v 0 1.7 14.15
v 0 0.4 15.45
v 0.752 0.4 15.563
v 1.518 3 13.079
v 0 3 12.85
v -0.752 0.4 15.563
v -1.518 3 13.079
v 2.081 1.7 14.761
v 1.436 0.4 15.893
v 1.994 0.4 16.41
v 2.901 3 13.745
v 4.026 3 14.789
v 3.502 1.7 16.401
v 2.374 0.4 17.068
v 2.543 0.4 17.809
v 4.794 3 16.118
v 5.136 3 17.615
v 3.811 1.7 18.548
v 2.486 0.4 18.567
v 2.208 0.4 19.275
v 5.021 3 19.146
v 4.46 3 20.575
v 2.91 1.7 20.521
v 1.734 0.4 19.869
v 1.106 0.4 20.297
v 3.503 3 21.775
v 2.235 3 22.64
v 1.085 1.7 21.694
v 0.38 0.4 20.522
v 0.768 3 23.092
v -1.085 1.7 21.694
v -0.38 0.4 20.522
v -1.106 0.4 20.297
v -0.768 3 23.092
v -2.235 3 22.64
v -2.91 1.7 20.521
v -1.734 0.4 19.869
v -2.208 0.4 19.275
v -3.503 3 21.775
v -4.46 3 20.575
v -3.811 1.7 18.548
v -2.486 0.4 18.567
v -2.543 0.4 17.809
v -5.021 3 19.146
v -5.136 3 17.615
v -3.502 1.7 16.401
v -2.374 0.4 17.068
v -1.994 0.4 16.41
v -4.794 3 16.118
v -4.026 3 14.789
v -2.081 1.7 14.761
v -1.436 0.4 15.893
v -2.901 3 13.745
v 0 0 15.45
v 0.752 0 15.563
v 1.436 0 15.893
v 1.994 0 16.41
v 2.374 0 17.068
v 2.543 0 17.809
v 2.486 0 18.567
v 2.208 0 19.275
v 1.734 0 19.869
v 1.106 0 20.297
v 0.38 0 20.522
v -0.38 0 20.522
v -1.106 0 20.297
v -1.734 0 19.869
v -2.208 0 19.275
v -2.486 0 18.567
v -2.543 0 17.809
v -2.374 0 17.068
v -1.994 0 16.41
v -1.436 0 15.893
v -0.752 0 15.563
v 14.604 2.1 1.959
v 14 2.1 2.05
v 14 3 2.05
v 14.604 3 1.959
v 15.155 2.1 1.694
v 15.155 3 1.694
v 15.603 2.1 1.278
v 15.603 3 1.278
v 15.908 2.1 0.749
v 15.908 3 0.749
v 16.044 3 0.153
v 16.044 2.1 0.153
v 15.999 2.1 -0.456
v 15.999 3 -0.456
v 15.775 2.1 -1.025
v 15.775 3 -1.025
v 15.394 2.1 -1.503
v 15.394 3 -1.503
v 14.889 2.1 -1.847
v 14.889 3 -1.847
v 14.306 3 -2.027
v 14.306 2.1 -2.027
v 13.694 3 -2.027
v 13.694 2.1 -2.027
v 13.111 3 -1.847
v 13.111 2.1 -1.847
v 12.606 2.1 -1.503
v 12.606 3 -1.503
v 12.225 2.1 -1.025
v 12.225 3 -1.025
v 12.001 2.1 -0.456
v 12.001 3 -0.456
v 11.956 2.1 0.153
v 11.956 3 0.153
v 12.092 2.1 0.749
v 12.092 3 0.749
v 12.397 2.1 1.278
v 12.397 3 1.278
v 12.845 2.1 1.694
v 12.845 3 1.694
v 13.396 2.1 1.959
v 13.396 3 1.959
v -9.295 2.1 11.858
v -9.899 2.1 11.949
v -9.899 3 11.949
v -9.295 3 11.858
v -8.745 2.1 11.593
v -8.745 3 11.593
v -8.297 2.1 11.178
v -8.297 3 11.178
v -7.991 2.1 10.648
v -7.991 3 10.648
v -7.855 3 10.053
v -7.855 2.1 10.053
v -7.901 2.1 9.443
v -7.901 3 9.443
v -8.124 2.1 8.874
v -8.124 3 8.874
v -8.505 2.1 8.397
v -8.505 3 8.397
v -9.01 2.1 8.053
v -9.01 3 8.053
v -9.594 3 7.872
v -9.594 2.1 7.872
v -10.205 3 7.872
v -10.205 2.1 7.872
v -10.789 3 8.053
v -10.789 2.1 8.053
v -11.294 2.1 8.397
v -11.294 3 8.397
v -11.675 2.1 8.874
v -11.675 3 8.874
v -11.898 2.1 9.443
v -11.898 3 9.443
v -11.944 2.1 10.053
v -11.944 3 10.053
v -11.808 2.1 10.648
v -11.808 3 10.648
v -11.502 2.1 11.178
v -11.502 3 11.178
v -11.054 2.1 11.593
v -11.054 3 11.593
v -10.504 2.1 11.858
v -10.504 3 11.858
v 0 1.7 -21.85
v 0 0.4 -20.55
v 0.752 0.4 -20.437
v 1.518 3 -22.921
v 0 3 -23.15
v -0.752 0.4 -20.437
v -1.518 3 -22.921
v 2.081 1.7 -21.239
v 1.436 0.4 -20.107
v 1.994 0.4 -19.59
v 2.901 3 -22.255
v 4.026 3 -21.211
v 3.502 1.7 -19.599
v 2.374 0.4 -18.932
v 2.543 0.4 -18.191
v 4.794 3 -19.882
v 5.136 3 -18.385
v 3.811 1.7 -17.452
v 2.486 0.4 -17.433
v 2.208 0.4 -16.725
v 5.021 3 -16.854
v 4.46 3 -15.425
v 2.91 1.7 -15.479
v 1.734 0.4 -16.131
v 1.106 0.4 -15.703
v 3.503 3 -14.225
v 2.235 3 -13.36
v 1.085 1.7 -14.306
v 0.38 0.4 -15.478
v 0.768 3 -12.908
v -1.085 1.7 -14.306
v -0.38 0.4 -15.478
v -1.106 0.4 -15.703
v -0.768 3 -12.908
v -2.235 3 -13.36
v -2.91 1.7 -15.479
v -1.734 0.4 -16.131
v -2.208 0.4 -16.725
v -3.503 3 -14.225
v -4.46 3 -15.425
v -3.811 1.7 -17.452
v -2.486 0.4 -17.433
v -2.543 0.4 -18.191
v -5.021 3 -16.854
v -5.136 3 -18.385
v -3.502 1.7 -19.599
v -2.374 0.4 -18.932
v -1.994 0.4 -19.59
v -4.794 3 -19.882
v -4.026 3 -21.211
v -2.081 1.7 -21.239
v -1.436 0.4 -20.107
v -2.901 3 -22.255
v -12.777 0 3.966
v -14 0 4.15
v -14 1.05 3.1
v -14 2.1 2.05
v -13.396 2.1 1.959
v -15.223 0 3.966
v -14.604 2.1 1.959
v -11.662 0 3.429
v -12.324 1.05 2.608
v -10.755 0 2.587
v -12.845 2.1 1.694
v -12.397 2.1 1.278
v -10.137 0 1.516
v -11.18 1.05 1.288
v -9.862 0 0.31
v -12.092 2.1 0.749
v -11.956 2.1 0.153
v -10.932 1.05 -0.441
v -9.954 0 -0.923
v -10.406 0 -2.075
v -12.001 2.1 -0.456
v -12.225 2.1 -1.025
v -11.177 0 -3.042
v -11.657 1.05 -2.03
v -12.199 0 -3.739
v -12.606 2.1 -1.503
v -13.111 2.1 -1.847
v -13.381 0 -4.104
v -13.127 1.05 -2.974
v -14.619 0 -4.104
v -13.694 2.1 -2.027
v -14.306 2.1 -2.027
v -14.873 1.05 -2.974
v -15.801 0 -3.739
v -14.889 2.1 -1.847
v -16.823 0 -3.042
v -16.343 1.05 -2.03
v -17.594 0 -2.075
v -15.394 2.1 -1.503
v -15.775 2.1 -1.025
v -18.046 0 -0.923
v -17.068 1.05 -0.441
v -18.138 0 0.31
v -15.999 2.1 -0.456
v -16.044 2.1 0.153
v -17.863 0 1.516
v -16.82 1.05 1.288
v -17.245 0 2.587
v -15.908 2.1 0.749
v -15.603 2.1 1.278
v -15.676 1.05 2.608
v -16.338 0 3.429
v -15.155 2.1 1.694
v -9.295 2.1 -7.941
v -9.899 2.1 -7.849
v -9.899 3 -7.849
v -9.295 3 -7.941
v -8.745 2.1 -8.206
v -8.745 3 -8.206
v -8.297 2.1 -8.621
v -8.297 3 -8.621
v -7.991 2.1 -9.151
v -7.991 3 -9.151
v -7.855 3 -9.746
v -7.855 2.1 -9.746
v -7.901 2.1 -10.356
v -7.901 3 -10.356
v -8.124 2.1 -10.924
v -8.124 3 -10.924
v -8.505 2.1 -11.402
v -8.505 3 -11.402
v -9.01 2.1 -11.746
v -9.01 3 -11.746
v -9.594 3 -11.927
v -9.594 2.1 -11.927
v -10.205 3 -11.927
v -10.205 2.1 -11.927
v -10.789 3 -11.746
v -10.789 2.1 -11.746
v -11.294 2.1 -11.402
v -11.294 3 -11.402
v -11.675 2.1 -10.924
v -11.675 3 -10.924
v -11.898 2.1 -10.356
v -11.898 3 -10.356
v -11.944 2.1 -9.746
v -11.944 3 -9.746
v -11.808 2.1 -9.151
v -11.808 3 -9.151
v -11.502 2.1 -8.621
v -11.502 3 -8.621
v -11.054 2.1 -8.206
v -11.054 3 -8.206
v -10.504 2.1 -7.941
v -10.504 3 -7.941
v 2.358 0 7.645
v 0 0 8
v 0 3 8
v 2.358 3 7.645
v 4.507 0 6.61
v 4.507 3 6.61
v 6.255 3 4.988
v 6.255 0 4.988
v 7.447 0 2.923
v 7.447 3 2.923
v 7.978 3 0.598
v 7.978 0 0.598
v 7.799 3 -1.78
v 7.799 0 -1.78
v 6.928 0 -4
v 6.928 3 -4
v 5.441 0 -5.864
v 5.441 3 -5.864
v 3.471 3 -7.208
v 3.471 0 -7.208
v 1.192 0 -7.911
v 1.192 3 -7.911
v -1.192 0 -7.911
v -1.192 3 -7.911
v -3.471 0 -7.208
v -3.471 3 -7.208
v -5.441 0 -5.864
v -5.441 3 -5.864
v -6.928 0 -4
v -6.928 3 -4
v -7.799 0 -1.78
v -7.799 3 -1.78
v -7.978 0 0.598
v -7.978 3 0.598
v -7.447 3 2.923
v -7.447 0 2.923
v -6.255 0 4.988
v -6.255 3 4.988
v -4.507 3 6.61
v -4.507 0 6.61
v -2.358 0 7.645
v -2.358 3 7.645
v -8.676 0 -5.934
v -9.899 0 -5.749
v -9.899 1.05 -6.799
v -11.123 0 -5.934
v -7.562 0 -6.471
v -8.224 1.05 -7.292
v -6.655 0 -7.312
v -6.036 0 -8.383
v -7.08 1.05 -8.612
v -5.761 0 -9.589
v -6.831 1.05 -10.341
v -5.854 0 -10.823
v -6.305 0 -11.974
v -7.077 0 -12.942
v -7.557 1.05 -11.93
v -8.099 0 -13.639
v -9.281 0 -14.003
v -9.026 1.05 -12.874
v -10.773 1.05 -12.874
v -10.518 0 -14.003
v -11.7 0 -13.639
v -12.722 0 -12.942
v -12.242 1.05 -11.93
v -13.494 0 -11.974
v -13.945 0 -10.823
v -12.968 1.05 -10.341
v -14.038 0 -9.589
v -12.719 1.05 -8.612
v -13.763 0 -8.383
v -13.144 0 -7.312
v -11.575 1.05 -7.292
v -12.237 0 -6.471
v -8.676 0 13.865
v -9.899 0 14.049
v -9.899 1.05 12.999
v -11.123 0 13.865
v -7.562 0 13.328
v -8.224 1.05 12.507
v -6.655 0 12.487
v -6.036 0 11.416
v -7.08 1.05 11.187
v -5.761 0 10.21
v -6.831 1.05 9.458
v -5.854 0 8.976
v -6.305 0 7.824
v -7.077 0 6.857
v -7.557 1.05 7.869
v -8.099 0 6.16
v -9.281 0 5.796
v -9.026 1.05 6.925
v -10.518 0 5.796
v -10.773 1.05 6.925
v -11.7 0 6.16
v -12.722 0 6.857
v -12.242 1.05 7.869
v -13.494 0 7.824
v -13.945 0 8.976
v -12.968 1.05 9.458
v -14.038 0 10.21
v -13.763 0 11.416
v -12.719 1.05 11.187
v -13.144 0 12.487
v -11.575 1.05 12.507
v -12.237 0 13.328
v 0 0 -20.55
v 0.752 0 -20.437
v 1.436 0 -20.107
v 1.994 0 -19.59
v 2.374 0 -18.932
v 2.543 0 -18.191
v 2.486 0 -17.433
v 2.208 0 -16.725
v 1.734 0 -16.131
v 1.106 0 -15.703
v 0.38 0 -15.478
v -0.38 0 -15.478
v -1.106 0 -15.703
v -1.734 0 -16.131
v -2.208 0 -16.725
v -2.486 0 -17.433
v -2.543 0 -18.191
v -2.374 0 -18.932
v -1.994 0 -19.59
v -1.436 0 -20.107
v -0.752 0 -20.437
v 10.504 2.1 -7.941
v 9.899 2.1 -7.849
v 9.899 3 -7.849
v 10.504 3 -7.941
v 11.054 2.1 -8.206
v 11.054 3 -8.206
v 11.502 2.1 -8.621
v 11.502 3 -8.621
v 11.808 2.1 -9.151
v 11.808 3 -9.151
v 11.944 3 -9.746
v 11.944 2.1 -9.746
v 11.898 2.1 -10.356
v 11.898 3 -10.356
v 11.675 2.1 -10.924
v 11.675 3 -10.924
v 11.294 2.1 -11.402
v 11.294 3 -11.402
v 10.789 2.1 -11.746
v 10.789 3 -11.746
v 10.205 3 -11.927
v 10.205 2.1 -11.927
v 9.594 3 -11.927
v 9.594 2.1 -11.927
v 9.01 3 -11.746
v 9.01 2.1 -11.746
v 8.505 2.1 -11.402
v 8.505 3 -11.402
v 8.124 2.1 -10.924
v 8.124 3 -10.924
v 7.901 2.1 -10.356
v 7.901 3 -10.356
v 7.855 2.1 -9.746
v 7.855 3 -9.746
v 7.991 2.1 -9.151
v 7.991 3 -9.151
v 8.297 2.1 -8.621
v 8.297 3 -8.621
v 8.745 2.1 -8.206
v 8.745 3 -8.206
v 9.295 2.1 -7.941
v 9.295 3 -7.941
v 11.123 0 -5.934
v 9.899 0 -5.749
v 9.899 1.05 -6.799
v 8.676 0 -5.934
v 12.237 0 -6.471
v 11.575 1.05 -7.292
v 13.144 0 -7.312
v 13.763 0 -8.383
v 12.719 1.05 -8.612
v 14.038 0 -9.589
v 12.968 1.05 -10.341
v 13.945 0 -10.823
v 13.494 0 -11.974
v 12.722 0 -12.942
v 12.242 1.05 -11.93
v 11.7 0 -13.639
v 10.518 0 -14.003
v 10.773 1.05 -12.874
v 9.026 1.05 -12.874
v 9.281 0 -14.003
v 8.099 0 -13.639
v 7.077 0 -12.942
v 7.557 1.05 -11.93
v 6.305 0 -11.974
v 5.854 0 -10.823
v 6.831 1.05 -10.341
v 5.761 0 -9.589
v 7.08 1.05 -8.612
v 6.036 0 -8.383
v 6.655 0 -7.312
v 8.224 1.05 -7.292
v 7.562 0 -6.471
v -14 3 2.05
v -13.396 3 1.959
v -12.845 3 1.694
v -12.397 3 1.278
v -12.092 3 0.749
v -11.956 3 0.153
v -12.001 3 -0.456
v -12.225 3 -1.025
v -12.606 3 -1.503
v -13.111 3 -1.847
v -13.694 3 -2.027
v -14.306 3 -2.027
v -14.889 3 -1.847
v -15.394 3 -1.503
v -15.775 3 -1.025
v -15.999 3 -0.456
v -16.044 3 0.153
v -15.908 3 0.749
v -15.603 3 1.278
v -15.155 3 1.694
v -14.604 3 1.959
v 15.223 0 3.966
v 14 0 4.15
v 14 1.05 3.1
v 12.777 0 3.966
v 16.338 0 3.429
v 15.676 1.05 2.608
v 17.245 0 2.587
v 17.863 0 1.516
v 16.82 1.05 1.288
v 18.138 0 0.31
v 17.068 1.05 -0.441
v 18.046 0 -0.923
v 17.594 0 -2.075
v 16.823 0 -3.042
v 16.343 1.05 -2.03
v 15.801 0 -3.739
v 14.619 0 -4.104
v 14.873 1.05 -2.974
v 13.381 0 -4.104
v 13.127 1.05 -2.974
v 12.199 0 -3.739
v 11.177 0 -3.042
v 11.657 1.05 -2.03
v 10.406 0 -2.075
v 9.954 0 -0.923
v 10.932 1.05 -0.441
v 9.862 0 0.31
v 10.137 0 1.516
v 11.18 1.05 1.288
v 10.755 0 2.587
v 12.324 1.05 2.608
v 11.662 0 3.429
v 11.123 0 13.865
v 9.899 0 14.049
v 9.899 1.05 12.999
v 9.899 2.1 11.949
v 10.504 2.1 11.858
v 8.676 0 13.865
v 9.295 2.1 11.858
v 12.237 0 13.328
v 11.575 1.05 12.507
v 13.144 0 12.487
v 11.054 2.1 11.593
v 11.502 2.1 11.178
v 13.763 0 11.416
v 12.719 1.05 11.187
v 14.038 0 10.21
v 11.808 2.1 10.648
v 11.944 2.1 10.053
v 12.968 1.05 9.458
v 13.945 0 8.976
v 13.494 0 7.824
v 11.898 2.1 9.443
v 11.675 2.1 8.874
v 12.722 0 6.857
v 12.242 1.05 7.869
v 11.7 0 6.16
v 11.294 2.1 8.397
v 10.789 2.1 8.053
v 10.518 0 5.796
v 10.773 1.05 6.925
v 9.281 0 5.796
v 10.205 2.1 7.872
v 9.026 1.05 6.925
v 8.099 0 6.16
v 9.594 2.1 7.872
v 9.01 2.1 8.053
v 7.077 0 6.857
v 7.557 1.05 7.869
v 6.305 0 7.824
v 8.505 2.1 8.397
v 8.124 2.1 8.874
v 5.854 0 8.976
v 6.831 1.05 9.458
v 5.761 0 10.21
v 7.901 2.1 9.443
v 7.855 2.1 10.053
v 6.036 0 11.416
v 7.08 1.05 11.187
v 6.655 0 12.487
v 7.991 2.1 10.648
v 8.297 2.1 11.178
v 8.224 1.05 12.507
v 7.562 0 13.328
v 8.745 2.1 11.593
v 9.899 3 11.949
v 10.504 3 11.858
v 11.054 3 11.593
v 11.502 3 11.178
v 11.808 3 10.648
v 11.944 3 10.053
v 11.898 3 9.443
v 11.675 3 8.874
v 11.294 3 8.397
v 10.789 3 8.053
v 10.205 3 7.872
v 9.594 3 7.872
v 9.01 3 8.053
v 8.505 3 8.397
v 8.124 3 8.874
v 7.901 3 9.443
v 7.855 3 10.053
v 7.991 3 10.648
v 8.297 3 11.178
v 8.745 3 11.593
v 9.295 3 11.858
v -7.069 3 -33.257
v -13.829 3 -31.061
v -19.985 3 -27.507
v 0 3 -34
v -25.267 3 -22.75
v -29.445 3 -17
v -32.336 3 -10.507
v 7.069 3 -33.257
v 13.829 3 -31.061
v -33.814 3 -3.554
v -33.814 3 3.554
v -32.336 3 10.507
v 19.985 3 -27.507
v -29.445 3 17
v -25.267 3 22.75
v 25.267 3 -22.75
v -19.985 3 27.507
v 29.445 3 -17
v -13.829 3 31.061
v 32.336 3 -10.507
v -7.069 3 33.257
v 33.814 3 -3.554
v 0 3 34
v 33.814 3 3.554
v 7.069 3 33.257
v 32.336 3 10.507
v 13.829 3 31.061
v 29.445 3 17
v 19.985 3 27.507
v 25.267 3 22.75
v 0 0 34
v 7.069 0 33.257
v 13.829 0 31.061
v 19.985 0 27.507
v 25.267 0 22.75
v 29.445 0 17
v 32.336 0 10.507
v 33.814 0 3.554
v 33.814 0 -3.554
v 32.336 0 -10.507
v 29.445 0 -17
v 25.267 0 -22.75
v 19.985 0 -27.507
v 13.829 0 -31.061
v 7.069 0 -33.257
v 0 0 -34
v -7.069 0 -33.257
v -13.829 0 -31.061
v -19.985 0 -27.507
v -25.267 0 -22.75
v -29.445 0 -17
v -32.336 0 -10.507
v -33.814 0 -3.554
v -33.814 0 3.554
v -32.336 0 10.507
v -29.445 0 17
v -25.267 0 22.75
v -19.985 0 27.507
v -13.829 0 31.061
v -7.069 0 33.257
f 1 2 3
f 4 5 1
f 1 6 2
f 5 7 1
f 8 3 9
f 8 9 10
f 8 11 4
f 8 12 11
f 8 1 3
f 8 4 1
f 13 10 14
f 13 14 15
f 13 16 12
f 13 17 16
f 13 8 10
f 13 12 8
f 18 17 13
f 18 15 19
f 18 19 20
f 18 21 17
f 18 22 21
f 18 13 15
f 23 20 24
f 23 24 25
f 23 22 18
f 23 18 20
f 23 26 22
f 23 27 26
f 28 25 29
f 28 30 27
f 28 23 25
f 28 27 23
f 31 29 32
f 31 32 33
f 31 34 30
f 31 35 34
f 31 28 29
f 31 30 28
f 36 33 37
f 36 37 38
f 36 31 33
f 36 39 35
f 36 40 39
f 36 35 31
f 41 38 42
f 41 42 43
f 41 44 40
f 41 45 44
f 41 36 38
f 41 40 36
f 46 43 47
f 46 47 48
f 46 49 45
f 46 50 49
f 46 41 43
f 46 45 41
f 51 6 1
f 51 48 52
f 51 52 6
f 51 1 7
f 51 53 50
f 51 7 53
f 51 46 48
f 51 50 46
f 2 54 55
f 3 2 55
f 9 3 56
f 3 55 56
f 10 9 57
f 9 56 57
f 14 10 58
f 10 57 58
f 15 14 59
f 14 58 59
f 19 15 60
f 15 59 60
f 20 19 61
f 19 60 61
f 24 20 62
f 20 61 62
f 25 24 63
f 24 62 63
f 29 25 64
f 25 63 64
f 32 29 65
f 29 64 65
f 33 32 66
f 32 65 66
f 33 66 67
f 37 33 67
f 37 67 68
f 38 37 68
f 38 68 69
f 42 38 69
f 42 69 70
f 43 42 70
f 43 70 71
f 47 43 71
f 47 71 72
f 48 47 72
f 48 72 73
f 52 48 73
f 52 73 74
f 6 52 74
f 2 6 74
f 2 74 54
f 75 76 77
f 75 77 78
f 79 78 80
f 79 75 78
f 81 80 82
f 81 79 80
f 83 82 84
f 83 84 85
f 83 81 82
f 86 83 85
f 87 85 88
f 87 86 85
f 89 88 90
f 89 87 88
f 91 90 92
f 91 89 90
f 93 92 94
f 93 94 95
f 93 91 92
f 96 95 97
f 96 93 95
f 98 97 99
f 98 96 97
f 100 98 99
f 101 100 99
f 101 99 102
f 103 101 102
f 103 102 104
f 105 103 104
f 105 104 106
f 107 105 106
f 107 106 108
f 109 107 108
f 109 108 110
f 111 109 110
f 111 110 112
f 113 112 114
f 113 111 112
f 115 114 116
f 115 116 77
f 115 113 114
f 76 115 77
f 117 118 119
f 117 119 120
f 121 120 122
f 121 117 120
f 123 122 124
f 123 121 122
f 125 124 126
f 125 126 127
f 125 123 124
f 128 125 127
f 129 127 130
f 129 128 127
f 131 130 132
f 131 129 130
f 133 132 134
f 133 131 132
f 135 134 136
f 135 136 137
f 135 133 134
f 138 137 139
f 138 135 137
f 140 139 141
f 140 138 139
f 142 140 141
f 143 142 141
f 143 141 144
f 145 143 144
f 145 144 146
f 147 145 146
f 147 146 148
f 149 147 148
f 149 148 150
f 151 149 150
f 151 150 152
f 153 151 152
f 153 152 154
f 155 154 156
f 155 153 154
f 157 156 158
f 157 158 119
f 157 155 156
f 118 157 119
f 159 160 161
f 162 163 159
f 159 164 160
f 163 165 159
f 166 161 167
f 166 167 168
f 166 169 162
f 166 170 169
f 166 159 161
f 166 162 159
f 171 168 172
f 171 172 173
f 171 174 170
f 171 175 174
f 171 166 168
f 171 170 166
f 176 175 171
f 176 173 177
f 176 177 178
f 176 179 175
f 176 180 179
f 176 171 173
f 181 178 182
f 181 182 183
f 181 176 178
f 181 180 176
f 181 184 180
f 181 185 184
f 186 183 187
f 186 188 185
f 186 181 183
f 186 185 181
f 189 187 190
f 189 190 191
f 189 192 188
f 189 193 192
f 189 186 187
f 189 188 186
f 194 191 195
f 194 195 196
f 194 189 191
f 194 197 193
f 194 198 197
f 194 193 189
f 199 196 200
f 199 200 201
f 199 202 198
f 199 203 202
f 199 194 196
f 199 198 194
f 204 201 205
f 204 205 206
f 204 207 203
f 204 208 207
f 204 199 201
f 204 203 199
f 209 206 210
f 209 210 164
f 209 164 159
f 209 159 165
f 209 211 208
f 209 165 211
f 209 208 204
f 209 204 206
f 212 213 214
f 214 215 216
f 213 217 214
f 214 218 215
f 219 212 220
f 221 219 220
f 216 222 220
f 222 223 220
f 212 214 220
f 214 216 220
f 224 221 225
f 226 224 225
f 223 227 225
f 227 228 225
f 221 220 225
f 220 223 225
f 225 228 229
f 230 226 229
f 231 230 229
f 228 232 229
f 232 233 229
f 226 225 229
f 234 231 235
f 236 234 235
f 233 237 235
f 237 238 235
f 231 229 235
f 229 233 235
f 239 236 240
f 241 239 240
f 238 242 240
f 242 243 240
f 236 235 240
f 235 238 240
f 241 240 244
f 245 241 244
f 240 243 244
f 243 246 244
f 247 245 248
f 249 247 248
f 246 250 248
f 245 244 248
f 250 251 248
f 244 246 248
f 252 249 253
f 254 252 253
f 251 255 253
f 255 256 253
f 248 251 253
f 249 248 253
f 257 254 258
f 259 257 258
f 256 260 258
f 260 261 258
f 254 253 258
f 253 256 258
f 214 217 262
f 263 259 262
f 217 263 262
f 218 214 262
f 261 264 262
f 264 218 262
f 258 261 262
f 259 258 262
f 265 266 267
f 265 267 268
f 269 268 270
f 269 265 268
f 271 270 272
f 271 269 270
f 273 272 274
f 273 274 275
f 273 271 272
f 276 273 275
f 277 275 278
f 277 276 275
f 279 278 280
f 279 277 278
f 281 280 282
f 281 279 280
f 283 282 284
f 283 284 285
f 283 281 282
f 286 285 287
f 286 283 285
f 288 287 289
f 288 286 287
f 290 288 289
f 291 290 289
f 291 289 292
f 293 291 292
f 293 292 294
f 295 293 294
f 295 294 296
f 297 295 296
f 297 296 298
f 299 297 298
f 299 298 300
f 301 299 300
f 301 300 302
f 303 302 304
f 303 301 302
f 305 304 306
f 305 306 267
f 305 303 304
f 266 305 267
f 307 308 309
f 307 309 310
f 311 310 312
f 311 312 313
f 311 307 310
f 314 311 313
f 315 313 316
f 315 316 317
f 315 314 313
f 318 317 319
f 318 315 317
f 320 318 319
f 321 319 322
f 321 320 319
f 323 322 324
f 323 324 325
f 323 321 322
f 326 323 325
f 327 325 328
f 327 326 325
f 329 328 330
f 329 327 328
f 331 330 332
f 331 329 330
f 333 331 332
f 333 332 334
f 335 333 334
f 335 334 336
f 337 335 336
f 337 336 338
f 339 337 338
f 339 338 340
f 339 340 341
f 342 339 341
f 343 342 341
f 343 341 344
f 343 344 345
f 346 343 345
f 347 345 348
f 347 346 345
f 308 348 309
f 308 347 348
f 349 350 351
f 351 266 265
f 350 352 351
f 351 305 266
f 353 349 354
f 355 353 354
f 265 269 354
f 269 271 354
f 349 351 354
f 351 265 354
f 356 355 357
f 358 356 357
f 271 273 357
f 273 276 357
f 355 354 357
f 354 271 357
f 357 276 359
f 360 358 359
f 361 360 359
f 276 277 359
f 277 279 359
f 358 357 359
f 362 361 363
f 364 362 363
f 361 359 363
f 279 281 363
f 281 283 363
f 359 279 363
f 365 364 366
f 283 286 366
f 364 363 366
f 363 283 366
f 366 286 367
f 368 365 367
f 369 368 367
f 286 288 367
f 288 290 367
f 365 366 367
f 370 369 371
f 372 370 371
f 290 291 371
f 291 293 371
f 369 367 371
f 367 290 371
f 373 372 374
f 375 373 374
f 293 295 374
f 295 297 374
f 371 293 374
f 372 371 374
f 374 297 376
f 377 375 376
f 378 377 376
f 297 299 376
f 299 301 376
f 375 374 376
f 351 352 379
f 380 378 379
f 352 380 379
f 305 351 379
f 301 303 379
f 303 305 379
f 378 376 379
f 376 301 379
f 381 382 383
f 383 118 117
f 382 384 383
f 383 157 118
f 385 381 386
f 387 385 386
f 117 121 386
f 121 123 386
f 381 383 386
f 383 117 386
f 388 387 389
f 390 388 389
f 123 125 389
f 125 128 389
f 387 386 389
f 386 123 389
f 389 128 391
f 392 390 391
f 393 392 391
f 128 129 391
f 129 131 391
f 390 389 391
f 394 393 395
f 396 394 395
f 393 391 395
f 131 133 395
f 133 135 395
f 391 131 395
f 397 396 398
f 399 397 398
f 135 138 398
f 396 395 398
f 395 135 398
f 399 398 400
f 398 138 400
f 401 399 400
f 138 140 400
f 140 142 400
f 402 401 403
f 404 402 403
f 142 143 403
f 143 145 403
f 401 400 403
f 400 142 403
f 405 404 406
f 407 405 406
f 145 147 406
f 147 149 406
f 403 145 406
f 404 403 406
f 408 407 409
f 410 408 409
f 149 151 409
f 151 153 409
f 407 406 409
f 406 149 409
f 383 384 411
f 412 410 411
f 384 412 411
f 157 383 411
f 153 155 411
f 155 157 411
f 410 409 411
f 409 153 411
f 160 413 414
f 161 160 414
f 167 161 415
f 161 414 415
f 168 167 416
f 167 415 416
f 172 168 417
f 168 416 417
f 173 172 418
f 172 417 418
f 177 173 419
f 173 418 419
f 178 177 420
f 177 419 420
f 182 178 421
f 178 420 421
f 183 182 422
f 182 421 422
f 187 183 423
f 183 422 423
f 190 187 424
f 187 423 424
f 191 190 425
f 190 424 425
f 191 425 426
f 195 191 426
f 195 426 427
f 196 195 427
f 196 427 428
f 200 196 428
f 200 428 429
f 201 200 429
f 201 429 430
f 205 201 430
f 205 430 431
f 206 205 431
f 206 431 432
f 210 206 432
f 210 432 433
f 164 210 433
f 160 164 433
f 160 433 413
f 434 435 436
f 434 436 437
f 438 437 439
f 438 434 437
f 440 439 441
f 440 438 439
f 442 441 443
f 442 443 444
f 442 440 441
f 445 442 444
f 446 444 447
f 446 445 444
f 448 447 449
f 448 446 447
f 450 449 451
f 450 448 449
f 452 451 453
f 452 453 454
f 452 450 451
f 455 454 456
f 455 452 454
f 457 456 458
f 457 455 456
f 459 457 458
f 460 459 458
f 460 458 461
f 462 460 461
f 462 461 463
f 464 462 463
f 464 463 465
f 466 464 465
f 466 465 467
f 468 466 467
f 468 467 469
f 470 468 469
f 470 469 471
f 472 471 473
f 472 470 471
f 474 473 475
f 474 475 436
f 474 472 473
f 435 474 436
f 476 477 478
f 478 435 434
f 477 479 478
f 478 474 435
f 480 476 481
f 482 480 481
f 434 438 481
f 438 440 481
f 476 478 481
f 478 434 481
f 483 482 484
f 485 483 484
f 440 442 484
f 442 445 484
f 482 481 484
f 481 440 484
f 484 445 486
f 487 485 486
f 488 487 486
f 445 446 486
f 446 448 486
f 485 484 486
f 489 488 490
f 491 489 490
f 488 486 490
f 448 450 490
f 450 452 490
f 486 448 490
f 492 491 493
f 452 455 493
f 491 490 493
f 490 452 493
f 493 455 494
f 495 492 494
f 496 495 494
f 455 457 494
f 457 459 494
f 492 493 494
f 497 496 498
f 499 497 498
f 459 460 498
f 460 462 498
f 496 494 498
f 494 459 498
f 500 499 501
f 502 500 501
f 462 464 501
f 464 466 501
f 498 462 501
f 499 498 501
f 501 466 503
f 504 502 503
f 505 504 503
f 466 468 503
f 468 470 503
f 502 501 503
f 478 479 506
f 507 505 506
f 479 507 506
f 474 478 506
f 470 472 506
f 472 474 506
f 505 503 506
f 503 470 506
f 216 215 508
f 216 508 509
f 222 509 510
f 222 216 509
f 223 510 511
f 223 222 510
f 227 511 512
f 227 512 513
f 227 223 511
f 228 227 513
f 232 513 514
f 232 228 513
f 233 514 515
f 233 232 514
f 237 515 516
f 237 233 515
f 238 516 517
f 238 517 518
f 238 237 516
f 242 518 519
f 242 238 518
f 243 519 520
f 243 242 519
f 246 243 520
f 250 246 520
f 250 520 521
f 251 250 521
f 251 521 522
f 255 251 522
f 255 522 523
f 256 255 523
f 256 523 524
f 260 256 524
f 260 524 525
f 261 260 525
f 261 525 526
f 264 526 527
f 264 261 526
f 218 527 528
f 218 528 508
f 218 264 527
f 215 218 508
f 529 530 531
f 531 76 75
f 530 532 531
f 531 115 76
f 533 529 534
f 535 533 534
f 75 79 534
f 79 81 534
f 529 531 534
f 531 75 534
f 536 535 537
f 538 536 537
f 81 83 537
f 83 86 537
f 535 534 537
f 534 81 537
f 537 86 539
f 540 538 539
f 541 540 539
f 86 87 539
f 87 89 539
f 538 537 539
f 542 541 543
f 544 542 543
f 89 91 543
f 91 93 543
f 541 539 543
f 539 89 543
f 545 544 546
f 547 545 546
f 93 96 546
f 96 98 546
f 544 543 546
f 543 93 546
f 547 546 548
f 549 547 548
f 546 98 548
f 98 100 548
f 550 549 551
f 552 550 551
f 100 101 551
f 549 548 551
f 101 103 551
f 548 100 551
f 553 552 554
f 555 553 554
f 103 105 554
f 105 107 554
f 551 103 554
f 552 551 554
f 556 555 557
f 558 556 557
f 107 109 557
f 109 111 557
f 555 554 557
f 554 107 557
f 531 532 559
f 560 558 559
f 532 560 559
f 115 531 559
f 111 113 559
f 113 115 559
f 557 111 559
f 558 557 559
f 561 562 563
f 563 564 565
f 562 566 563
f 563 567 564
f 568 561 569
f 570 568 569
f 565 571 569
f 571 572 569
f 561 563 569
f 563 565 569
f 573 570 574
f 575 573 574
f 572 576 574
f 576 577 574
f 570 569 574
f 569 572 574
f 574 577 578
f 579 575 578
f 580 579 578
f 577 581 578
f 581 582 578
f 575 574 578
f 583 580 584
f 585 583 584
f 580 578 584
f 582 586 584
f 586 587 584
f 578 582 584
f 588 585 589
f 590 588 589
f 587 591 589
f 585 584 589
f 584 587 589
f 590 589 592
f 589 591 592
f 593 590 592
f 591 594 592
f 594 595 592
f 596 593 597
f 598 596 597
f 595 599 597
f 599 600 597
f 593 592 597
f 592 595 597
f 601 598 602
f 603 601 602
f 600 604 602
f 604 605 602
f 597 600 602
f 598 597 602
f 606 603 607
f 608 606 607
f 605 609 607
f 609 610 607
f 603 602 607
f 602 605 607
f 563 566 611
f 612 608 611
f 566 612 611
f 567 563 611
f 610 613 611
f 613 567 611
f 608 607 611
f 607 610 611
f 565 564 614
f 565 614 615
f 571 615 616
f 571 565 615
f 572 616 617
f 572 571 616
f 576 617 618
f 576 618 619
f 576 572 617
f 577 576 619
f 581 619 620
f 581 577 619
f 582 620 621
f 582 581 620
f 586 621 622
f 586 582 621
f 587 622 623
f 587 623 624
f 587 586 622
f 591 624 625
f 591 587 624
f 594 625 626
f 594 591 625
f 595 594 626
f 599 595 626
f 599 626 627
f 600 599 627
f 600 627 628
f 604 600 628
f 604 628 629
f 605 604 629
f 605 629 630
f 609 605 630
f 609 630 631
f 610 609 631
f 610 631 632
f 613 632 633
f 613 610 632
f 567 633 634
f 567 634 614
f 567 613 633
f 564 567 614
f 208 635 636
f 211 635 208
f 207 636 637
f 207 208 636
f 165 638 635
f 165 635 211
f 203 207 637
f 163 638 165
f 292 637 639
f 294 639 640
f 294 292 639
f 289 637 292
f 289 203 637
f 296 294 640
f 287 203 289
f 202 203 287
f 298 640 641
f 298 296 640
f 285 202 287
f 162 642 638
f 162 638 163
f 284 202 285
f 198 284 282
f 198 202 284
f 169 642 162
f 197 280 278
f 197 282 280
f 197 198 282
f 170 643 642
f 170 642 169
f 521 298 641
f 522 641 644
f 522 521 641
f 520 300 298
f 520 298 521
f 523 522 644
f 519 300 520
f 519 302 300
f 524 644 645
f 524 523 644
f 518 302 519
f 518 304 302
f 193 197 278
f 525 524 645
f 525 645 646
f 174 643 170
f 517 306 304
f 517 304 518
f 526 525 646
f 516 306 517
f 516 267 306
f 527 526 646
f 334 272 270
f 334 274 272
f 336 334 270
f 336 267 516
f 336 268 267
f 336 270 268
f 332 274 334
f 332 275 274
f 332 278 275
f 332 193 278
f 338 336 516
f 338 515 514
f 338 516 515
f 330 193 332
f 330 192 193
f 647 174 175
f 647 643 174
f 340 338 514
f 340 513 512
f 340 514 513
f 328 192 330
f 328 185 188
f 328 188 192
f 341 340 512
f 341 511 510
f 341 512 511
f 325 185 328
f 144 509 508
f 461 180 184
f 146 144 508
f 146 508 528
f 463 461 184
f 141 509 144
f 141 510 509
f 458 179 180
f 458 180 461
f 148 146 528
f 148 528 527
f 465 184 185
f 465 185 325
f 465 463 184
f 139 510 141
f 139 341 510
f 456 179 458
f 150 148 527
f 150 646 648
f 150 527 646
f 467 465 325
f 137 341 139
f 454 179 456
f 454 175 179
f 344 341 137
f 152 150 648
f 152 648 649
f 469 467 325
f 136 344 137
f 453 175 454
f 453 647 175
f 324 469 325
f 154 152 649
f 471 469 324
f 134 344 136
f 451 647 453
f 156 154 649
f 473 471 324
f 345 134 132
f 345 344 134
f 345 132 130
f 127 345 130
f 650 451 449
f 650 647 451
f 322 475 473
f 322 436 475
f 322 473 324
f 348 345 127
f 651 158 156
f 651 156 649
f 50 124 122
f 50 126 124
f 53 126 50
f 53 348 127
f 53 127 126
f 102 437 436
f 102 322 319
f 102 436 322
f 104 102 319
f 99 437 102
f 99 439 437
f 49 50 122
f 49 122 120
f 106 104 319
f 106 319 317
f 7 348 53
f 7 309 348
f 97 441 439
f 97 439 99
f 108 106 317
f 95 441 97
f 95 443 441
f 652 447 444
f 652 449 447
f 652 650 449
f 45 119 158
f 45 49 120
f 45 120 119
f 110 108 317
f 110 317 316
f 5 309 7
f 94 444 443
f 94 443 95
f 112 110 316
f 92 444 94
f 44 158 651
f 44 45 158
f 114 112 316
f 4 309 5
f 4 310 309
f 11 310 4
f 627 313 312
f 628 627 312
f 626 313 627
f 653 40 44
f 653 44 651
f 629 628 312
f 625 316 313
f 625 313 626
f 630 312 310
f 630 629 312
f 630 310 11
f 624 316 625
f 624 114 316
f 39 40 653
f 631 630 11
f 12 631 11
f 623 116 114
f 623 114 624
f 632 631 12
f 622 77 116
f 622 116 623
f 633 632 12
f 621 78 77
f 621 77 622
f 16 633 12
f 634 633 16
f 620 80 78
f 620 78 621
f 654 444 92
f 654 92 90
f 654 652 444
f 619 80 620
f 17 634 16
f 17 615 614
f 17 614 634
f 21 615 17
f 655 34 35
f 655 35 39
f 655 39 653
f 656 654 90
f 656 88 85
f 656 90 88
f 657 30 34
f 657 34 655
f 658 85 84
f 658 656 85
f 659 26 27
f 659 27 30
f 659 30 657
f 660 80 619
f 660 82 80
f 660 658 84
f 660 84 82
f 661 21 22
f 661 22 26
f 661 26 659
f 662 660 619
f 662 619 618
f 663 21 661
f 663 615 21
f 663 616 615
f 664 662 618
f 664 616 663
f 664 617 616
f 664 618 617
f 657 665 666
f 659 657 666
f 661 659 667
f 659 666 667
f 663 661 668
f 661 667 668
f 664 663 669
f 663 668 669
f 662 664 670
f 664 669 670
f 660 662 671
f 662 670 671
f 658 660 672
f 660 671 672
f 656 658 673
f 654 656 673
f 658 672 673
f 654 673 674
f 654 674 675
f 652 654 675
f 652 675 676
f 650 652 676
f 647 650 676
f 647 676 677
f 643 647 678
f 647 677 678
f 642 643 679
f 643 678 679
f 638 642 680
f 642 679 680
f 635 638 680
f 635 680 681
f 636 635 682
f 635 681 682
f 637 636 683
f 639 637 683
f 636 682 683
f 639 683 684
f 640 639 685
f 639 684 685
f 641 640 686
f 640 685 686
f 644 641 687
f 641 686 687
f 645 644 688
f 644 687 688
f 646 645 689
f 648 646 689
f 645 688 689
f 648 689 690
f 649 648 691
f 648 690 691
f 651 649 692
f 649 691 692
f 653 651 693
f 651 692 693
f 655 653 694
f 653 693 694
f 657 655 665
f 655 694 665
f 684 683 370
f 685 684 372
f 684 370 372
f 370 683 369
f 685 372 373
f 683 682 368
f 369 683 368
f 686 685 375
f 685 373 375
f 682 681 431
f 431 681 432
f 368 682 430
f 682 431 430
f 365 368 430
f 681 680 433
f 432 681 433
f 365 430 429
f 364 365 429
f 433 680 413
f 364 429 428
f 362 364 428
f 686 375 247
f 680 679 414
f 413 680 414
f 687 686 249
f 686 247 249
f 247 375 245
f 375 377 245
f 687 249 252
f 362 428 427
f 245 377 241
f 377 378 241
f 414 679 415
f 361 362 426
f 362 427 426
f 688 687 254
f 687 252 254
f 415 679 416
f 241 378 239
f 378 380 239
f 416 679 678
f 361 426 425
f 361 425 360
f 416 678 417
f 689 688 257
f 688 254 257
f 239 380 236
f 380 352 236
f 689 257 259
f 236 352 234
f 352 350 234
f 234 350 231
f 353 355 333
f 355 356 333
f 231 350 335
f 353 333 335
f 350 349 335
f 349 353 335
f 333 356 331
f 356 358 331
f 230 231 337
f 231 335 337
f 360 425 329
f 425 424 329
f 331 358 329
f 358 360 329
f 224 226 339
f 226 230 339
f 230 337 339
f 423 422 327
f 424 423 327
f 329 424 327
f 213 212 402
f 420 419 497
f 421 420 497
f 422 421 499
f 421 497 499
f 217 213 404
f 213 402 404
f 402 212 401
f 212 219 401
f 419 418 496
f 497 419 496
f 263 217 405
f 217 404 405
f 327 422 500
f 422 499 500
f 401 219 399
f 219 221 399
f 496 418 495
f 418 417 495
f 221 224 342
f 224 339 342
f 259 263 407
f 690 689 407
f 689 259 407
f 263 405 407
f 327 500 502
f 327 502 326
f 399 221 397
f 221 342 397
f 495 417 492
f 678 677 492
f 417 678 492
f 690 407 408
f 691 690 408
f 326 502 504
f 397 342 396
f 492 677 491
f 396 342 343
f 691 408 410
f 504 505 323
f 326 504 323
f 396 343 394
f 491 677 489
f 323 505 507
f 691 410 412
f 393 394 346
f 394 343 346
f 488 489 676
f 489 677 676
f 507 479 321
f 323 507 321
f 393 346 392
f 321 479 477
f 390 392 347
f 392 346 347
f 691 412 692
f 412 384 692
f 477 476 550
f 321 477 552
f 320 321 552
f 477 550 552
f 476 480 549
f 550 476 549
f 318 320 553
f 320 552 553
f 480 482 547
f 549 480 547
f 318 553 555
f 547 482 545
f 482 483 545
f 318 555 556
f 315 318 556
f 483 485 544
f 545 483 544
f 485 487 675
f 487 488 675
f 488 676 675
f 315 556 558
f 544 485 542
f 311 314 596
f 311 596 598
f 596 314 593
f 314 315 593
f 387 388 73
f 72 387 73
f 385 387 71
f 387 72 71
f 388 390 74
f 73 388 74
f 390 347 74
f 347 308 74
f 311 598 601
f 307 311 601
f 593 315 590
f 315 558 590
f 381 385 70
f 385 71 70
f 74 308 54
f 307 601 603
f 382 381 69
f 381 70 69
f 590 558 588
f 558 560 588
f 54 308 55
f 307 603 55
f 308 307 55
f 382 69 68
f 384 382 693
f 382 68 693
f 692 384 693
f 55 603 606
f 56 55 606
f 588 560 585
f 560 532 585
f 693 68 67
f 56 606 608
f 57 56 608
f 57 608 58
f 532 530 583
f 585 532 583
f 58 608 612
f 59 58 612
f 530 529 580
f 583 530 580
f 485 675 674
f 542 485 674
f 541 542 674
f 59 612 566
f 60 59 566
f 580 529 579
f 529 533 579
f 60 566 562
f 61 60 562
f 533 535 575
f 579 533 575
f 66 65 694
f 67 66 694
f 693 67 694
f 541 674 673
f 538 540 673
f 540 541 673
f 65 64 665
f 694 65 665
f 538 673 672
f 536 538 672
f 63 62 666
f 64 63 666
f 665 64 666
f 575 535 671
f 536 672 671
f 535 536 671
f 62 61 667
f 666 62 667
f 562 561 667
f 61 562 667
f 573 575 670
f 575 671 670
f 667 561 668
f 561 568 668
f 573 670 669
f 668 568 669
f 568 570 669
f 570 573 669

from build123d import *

# Parameters (mm, degrees)
SKETCH_1_R          = 34
SKETCH_1_R_2        = 8
SKETCH_1_R_3        = 2.05
EXTRUDE_1_DEPTH     = 3
SKETCH_2_R          = 2.55
CUT_EXTRUDE_1_DEPTH = 10
CHAMFER_1_SIZE      = 2.1
CHAMFER_2_SIZE      = 2.6


with BuildPart() as part:
    # 草图1 → 凸台-拉伸1 (new body)
    with BuildSketch(Plane(origin=(0, 0, 0), x_dir=(1, 0, 0), z_dir=(0, 1, 0))):
        with Locations(Location((0, 0, 0), (0, 0, 270))):
            Circle(SKETCH_1_R)
        with Locations(Location((0, 0, 0), (0, 0, 270))):
            Circle(SKETCH_1_R_2, mode=Mode.SUBTRACT)
        with Locations(Location((9.899494937, 9.899494937, 0), (0, 0, 270))):
            Circle(SKETCH_1_R_3, mode=Mode.SUBTRACT)
        with Locations(Location((14, 0, 0), (0, 0, 270))):
            Circle(SKETCH_1_R_3, mode=Mode.SUBTRACT)
        with Locations(Location((9.899494937, -9.899494937, 0), (0, 0, 270))):
            Circle(SKETCH_1_R_3, mode=Mode.SUBTRACT)
        with Locations(Location((-9.899494937, -9.899494937, 0), (0, 0, 270))):
            Circle(SKETCH_1_R_3, mode=Mode.SUBTRACT)
        with Locations(Location((-14, 0, 0), (0, 0, 270))):
            Circle(SKETCH_1_R_3, mode=Mode.SUBTRACT)
        with Locations(Location((-9.899494937, 9.899494937, 0), (0, 0, 270))):
            Circle(SKETCH_1_R_3, mode=Mode.SUBTRACT)
    extrude(amount=EXTRUDE_1_DEPTH)

    # 草图2 → 切除-拉伸1 (cut)
    with BuildSketch(Plane(origin=(0, 0, 0), x_dir=(-1, 0, 0), z_dir=(0, -1, 0))):
        with Locations(Location((0, 18, 0), (0, 0, 90))):
            Circle(SKETCH_2_R)
        with Locations(Location((0, -18, 0), (0, 0, 90))):
            Circle(SKETCH_2_R)
    extrude(amount=-CUT_EXTRUDE_1_DEPTH, mode=Mode.SUBTRACT)

    # 倒角1
    chamfer_1_edges = [part.edges().sort_by_distance(p)[0] for p in [
        (-9.899494937, 0, 7.849494937),
        (9.899494937, 0, -11.949494937),
        (14, 0, -2.05),
        (9.899494937, 0, 7.849494937),
        (-9.899494937, 0, -11.949494937),
        (-14, 0, -2.05),
    ]]
    chamfer(chamfer_1_edges, length=CHAMFER_1_SIZE)

    # 倒角2
    chamfer_2_edges = [part.edges().sort_by_distance(p)[0] for p in [
        (0, 3, -15.45),
        (0, 3, 20.55),
    ]]
    chamfer(chamfer_2_edges, length=CHAMFER_2_SIZE)


solid = part.part
